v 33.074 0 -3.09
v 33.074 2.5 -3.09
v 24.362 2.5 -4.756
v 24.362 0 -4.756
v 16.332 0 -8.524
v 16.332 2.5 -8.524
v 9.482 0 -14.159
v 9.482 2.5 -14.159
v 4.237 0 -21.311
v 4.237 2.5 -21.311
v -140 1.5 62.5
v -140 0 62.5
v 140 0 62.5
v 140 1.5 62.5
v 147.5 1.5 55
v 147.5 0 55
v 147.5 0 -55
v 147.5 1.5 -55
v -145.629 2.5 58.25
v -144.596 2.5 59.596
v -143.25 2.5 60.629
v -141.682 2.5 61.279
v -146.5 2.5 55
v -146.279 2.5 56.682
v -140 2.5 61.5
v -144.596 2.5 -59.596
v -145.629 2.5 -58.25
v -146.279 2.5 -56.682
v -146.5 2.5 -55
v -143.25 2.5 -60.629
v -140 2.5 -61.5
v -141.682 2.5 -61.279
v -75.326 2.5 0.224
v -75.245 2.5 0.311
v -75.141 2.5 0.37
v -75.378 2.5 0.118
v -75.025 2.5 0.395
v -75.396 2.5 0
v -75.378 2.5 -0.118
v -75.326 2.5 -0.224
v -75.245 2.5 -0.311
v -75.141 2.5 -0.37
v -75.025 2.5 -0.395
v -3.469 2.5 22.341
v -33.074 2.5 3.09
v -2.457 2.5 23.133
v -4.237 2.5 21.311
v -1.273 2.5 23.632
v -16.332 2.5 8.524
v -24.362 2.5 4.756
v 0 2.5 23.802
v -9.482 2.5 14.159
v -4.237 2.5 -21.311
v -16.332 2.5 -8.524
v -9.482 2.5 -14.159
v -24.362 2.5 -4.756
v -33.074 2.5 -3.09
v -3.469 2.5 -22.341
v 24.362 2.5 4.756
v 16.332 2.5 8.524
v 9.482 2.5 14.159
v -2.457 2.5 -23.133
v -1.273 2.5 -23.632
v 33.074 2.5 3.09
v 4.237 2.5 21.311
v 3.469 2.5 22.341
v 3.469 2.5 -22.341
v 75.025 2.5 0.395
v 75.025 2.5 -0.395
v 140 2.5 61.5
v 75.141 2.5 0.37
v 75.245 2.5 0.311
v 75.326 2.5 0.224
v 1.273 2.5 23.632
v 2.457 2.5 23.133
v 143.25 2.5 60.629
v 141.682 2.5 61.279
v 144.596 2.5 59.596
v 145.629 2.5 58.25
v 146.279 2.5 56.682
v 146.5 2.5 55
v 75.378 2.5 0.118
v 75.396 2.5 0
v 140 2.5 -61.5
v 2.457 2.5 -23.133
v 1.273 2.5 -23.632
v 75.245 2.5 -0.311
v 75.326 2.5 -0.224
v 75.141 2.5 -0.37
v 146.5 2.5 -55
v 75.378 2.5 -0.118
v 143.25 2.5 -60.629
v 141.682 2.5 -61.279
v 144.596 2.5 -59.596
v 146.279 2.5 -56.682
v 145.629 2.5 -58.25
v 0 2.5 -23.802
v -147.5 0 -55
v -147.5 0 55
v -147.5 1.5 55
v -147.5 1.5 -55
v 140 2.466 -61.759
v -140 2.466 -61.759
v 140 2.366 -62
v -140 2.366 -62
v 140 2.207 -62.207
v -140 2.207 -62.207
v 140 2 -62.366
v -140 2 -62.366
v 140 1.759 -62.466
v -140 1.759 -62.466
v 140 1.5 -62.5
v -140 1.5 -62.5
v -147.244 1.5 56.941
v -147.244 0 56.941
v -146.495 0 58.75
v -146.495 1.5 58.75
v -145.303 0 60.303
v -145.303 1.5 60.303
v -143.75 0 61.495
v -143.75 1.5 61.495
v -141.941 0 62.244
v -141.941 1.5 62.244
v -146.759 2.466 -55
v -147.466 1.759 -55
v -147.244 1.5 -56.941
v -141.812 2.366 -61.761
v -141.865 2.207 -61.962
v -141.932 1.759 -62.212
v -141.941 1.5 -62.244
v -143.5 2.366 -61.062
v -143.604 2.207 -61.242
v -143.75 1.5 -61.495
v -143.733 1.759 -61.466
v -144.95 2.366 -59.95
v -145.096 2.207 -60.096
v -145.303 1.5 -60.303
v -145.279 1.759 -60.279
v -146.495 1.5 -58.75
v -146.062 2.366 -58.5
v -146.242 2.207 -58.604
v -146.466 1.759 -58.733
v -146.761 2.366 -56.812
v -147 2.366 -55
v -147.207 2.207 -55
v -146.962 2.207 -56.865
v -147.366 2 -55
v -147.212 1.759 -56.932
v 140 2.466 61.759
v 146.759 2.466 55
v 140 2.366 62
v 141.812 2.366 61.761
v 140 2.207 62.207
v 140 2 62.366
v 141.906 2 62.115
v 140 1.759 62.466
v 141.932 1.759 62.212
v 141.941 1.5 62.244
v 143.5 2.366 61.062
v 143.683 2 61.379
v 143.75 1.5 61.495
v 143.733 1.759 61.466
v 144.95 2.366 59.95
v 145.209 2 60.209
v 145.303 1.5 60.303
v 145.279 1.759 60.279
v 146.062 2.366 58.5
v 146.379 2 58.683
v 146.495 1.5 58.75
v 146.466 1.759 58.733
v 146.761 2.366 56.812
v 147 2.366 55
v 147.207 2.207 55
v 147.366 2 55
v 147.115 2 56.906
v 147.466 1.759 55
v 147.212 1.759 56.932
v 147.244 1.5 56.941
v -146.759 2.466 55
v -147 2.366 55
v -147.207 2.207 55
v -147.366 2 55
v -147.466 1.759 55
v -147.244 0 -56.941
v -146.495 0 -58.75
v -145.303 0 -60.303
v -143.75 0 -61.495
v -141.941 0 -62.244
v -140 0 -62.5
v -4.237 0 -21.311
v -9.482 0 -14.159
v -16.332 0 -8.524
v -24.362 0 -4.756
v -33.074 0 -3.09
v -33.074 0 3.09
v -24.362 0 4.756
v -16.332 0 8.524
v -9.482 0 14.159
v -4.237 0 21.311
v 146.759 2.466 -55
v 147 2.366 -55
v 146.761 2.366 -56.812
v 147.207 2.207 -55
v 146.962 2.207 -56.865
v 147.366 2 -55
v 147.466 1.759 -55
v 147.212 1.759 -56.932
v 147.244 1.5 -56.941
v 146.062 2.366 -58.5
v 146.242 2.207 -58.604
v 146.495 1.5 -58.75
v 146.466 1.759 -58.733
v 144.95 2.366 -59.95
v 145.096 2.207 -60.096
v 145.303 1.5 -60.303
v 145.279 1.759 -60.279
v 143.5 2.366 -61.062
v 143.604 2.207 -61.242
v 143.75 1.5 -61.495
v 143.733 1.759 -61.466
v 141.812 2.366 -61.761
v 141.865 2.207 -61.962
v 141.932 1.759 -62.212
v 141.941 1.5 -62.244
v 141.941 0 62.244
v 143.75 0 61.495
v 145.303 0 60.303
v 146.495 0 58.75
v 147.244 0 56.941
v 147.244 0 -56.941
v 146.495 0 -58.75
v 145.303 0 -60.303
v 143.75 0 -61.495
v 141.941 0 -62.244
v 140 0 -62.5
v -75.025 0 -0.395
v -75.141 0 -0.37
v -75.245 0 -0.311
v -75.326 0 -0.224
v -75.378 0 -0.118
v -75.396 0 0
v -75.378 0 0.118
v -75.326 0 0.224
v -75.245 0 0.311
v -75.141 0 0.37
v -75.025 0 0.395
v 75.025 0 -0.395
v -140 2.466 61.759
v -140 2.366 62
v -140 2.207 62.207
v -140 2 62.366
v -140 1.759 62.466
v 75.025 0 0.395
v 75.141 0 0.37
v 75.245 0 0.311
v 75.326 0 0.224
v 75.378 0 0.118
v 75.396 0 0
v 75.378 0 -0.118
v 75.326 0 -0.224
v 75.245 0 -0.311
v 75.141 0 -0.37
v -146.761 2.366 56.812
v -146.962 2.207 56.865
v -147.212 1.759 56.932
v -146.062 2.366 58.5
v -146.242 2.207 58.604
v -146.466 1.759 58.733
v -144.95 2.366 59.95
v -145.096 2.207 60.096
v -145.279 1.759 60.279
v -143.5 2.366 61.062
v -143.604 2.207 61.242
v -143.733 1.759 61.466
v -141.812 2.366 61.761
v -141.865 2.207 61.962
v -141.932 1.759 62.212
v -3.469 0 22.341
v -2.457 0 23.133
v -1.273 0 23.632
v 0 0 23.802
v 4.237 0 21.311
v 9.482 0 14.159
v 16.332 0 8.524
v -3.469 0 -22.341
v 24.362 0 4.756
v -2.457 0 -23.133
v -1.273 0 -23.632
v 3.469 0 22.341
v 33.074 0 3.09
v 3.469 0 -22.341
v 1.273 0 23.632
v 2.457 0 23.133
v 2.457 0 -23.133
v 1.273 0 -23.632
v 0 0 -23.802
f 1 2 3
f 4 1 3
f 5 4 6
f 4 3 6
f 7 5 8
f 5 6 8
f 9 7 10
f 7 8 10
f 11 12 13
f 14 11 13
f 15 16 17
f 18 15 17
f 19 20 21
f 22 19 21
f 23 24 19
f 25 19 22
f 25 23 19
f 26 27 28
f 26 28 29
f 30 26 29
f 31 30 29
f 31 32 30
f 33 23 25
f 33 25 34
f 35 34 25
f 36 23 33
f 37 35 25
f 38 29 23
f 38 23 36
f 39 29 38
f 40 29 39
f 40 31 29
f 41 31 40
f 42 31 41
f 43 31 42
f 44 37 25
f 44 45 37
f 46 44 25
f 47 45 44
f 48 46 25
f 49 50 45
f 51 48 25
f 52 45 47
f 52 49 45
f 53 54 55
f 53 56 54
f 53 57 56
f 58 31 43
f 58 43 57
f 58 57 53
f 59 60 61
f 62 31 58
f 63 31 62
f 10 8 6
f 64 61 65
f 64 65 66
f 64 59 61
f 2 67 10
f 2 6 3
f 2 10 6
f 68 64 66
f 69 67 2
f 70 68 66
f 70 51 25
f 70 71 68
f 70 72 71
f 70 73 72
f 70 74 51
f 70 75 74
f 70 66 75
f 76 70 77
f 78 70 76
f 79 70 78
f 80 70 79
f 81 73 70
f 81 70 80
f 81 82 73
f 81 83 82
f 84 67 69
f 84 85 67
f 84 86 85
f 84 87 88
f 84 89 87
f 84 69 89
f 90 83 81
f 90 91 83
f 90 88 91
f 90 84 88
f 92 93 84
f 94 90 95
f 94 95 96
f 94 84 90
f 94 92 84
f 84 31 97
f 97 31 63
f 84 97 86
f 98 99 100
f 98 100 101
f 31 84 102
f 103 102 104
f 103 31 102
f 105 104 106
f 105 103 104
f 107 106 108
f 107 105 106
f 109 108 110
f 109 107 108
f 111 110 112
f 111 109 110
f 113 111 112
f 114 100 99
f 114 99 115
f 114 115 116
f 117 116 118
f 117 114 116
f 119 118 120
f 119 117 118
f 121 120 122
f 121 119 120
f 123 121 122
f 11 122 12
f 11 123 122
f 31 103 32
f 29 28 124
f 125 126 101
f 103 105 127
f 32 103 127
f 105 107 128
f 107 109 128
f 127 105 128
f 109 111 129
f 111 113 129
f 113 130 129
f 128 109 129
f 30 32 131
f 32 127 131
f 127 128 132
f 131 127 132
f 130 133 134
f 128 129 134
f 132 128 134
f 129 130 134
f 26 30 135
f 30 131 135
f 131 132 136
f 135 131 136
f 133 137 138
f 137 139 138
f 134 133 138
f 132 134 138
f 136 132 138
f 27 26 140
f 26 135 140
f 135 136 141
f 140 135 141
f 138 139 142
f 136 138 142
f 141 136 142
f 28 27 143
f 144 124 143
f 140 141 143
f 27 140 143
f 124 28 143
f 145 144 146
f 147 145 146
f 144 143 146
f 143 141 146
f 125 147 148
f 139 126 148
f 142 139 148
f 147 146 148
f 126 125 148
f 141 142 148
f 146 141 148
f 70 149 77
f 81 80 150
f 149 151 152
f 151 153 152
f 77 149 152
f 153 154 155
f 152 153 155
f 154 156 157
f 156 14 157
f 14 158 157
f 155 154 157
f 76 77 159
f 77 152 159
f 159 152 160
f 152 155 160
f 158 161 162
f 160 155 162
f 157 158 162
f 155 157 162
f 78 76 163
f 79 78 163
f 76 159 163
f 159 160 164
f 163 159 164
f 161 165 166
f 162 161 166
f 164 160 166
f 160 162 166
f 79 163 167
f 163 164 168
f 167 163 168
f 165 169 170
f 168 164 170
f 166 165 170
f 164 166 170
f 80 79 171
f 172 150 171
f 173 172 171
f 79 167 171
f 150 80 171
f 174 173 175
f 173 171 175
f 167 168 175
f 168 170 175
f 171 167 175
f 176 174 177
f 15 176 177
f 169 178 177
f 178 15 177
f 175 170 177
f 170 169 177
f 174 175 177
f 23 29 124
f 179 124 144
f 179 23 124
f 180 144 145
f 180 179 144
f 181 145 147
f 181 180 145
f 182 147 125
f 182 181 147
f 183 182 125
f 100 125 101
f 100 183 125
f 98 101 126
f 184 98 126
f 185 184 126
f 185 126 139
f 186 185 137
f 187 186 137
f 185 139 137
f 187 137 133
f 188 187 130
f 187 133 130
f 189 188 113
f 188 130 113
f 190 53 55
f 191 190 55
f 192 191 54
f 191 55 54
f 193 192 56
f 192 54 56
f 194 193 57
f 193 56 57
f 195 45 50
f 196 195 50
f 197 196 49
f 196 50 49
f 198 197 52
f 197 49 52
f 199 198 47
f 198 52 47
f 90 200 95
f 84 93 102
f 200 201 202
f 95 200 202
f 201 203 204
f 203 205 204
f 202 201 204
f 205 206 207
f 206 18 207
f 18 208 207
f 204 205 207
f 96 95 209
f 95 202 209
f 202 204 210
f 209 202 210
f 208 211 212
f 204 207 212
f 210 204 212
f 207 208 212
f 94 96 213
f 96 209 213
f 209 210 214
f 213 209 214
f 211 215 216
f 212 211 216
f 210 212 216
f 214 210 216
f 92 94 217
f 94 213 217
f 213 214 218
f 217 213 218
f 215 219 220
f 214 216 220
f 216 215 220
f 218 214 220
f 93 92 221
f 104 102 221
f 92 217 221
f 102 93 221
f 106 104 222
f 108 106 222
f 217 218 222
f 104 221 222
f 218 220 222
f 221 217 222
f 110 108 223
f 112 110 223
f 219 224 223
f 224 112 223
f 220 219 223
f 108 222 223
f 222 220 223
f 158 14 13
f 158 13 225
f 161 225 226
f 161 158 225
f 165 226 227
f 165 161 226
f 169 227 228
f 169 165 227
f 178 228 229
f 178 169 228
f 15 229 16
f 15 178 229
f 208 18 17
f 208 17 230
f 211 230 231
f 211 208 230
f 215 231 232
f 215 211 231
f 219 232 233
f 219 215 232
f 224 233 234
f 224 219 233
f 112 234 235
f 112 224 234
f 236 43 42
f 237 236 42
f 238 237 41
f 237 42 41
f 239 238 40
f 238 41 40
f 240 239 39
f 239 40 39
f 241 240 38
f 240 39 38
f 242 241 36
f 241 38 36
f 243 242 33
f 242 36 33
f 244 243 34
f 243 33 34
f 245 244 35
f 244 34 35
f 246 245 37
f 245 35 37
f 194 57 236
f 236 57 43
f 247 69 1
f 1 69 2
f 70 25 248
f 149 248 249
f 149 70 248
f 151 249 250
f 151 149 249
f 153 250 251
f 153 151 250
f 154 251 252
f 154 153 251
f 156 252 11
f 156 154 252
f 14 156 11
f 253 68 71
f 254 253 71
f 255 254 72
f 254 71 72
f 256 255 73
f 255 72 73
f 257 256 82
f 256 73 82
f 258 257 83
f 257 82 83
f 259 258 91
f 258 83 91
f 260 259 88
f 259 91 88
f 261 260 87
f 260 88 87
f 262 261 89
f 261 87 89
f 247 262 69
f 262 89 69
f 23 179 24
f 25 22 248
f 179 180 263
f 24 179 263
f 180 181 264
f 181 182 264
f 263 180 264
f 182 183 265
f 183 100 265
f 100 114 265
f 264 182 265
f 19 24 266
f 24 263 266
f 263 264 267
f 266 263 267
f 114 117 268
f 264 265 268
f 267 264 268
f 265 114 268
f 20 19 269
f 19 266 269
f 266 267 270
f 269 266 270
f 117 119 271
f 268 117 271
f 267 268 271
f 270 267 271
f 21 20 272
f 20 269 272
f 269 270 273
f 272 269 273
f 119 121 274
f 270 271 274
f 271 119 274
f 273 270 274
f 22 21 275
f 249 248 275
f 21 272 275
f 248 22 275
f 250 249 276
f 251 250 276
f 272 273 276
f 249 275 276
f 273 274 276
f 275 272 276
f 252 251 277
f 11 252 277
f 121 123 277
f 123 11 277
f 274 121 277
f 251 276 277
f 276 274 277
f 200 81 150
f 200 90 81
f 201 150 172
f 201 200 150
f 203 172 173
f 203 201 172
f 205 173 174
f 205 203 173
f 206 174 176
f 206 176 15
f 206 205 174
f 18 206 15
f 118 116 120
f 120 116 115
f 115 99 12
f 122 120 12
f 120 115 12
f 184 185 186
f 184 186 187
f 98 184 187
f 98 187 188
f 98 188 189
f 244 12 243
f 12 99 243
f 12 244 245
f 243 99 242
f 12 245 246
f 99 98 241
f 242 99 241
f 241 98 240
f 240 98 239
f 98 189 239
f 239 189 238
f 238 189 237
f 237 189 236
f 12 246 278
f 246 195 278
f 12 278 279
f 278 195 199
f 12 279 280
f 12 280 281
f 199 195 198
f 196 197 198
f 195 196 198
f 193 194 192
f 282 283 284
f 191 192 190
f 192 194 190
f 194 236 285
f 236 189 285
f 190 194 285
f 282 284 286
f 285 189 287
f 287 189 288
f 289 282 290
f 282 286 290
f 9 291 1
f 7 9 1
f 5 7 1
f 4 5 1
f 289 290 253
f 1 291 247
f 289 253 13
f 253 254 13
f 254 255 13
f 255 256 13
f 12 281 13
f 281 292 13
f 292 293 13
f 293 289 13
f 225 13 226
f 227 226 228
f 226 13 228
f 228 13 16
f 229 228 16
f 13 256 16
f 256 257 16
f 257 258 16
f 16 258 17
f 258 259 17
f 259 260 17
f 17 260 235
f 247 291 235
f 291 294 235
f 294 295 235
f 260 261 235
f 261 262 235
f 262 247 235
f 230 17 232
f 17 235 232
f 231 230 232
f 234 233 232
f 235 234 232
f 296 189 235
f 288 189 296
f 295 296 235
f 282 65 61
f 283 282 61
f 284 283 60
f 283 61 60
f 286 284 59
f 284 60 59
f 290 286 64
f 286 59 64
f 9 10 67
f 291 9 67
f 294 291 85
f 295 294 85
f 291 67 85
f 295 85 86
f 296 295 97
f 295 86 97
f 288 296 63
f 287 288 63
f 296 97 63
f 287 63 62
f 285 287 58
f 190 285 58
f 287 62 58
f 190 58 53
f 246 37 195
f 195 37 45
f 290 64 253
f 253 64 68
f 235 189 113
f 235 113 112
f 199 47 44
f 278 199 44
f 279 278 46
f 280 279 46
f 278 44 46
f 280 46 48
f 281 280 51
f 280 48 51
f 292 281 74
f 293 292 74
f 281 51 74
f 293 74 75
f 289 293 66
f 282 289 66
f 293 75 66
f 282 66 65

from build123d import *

# Parameters (mm, degrees)
SKETCH1_W           = 295
SKETCH1_H           = 125
BOSS_EXTRUDE1_DEPTH = 2.5
FILLET1_R           = 7.5
FILLET2_R           = 1
CUT_EXTRUDE4_DEPTH  = 10


with BuildPart() as part:
    # Sketch1 → Boss-Extrude1 (new body)
    with BuildSketch(Plane(origin=(0, 0, 0), x_dir=(1, 0, 0), z_dir=(0, 1, 0))):
        Rectangle(SKETCH1_W, SKETCH1_H)
    extrude(amount=BOSS_EXTRUDE1_DEPTH)

    # Fillet1
    fillet1_edges = [part.edges().sort_by_distance(p)[0] for p in [
        (147.5, 1.25, 62.5),
        (-147.5, 1.25, 62.5),
        (-147.5, 1.25, -62.5),
        (147.5, 1.25, -62.5),
    ]]
    fillet(fillet1_edges, radius=FILLET1_R)

    # Fillet2
    fillet2_edges = [part.edges().sort_by_distance(p)[0] for p in [
        (147.5, 2.5, 0),
        (0, 2.5, 62.5),
        (0, 2.5, -62.5),
        (-147.5, 2.5, 0),
        (-145.303300859, 2.5, -60.303300859),
        (145.303300859, 2.5, -60.303300859),
        (-145.303300859, 2.5, 60.303300859),
        (145.303300859, 2.5, 60.303300859),
    ]]
    fillet(fillet2_edges, radius=FILLET2_R)

    # Sketch4 → Cut-Extrude4 (cut)
    with BuildSketch(Plane(origin=(0, 2.5, 0), x_dir=(1, 0, 0), z_dir=(0, 1, 0))):
        with BuildLine():
            Line((-33.073998348, 3.090010623), (-75.025380216, 0.395089537))
            ThreePointArc((-75.025380216, 0.395089537), (-75.3959039, 0), (-75.025380216, -0.395089537))
            Line((-75.025380216, -0.395089537), (-33.073998348, -3.090010623))
            ThreePointArc((-33.073998348, -3.090010623), (-16.332033074, -8.52386445), (-4.236704547, -21.311483324))
            ThreePointArc((-4.236704547, -21.311483324), (0, -23.802100242), (4.236704547, -21.311483324))
            ThreePointArc((4.236704547, -21.311483324), (16.332033074, -8.52386445), (33.073998348, -3.090010623))
            Line((33.073998348, -3.090010623), (75.025380216, -0.395089537))
            ThreePointArc((75.025380216, -0.395089537), (75.3959039, 0), (75.025380216, 0.395089537))
            Line((75.025380216, 0.395089537), (33.073998348, 3.090010623))
            ThreePointArc((33.073998348, 3.090010623), (16.332033074, 8.52386445), (4.236704547, 21.311483324))
            ThreePointArc((4.236704547, 21.311483324), (0, 23.802100242), (-4.236704547, 21.311483324))
            ThreePointArc((-4.236704547, 21.311483324), (-16.332033074, 8.52386445), (-33.073998348, 3.090010623))
        make_face()
    extrude(amount=-CUT_EXTRUDE4_DEPTH, mode=Mode.SUBTRACT)


solid = part.part
